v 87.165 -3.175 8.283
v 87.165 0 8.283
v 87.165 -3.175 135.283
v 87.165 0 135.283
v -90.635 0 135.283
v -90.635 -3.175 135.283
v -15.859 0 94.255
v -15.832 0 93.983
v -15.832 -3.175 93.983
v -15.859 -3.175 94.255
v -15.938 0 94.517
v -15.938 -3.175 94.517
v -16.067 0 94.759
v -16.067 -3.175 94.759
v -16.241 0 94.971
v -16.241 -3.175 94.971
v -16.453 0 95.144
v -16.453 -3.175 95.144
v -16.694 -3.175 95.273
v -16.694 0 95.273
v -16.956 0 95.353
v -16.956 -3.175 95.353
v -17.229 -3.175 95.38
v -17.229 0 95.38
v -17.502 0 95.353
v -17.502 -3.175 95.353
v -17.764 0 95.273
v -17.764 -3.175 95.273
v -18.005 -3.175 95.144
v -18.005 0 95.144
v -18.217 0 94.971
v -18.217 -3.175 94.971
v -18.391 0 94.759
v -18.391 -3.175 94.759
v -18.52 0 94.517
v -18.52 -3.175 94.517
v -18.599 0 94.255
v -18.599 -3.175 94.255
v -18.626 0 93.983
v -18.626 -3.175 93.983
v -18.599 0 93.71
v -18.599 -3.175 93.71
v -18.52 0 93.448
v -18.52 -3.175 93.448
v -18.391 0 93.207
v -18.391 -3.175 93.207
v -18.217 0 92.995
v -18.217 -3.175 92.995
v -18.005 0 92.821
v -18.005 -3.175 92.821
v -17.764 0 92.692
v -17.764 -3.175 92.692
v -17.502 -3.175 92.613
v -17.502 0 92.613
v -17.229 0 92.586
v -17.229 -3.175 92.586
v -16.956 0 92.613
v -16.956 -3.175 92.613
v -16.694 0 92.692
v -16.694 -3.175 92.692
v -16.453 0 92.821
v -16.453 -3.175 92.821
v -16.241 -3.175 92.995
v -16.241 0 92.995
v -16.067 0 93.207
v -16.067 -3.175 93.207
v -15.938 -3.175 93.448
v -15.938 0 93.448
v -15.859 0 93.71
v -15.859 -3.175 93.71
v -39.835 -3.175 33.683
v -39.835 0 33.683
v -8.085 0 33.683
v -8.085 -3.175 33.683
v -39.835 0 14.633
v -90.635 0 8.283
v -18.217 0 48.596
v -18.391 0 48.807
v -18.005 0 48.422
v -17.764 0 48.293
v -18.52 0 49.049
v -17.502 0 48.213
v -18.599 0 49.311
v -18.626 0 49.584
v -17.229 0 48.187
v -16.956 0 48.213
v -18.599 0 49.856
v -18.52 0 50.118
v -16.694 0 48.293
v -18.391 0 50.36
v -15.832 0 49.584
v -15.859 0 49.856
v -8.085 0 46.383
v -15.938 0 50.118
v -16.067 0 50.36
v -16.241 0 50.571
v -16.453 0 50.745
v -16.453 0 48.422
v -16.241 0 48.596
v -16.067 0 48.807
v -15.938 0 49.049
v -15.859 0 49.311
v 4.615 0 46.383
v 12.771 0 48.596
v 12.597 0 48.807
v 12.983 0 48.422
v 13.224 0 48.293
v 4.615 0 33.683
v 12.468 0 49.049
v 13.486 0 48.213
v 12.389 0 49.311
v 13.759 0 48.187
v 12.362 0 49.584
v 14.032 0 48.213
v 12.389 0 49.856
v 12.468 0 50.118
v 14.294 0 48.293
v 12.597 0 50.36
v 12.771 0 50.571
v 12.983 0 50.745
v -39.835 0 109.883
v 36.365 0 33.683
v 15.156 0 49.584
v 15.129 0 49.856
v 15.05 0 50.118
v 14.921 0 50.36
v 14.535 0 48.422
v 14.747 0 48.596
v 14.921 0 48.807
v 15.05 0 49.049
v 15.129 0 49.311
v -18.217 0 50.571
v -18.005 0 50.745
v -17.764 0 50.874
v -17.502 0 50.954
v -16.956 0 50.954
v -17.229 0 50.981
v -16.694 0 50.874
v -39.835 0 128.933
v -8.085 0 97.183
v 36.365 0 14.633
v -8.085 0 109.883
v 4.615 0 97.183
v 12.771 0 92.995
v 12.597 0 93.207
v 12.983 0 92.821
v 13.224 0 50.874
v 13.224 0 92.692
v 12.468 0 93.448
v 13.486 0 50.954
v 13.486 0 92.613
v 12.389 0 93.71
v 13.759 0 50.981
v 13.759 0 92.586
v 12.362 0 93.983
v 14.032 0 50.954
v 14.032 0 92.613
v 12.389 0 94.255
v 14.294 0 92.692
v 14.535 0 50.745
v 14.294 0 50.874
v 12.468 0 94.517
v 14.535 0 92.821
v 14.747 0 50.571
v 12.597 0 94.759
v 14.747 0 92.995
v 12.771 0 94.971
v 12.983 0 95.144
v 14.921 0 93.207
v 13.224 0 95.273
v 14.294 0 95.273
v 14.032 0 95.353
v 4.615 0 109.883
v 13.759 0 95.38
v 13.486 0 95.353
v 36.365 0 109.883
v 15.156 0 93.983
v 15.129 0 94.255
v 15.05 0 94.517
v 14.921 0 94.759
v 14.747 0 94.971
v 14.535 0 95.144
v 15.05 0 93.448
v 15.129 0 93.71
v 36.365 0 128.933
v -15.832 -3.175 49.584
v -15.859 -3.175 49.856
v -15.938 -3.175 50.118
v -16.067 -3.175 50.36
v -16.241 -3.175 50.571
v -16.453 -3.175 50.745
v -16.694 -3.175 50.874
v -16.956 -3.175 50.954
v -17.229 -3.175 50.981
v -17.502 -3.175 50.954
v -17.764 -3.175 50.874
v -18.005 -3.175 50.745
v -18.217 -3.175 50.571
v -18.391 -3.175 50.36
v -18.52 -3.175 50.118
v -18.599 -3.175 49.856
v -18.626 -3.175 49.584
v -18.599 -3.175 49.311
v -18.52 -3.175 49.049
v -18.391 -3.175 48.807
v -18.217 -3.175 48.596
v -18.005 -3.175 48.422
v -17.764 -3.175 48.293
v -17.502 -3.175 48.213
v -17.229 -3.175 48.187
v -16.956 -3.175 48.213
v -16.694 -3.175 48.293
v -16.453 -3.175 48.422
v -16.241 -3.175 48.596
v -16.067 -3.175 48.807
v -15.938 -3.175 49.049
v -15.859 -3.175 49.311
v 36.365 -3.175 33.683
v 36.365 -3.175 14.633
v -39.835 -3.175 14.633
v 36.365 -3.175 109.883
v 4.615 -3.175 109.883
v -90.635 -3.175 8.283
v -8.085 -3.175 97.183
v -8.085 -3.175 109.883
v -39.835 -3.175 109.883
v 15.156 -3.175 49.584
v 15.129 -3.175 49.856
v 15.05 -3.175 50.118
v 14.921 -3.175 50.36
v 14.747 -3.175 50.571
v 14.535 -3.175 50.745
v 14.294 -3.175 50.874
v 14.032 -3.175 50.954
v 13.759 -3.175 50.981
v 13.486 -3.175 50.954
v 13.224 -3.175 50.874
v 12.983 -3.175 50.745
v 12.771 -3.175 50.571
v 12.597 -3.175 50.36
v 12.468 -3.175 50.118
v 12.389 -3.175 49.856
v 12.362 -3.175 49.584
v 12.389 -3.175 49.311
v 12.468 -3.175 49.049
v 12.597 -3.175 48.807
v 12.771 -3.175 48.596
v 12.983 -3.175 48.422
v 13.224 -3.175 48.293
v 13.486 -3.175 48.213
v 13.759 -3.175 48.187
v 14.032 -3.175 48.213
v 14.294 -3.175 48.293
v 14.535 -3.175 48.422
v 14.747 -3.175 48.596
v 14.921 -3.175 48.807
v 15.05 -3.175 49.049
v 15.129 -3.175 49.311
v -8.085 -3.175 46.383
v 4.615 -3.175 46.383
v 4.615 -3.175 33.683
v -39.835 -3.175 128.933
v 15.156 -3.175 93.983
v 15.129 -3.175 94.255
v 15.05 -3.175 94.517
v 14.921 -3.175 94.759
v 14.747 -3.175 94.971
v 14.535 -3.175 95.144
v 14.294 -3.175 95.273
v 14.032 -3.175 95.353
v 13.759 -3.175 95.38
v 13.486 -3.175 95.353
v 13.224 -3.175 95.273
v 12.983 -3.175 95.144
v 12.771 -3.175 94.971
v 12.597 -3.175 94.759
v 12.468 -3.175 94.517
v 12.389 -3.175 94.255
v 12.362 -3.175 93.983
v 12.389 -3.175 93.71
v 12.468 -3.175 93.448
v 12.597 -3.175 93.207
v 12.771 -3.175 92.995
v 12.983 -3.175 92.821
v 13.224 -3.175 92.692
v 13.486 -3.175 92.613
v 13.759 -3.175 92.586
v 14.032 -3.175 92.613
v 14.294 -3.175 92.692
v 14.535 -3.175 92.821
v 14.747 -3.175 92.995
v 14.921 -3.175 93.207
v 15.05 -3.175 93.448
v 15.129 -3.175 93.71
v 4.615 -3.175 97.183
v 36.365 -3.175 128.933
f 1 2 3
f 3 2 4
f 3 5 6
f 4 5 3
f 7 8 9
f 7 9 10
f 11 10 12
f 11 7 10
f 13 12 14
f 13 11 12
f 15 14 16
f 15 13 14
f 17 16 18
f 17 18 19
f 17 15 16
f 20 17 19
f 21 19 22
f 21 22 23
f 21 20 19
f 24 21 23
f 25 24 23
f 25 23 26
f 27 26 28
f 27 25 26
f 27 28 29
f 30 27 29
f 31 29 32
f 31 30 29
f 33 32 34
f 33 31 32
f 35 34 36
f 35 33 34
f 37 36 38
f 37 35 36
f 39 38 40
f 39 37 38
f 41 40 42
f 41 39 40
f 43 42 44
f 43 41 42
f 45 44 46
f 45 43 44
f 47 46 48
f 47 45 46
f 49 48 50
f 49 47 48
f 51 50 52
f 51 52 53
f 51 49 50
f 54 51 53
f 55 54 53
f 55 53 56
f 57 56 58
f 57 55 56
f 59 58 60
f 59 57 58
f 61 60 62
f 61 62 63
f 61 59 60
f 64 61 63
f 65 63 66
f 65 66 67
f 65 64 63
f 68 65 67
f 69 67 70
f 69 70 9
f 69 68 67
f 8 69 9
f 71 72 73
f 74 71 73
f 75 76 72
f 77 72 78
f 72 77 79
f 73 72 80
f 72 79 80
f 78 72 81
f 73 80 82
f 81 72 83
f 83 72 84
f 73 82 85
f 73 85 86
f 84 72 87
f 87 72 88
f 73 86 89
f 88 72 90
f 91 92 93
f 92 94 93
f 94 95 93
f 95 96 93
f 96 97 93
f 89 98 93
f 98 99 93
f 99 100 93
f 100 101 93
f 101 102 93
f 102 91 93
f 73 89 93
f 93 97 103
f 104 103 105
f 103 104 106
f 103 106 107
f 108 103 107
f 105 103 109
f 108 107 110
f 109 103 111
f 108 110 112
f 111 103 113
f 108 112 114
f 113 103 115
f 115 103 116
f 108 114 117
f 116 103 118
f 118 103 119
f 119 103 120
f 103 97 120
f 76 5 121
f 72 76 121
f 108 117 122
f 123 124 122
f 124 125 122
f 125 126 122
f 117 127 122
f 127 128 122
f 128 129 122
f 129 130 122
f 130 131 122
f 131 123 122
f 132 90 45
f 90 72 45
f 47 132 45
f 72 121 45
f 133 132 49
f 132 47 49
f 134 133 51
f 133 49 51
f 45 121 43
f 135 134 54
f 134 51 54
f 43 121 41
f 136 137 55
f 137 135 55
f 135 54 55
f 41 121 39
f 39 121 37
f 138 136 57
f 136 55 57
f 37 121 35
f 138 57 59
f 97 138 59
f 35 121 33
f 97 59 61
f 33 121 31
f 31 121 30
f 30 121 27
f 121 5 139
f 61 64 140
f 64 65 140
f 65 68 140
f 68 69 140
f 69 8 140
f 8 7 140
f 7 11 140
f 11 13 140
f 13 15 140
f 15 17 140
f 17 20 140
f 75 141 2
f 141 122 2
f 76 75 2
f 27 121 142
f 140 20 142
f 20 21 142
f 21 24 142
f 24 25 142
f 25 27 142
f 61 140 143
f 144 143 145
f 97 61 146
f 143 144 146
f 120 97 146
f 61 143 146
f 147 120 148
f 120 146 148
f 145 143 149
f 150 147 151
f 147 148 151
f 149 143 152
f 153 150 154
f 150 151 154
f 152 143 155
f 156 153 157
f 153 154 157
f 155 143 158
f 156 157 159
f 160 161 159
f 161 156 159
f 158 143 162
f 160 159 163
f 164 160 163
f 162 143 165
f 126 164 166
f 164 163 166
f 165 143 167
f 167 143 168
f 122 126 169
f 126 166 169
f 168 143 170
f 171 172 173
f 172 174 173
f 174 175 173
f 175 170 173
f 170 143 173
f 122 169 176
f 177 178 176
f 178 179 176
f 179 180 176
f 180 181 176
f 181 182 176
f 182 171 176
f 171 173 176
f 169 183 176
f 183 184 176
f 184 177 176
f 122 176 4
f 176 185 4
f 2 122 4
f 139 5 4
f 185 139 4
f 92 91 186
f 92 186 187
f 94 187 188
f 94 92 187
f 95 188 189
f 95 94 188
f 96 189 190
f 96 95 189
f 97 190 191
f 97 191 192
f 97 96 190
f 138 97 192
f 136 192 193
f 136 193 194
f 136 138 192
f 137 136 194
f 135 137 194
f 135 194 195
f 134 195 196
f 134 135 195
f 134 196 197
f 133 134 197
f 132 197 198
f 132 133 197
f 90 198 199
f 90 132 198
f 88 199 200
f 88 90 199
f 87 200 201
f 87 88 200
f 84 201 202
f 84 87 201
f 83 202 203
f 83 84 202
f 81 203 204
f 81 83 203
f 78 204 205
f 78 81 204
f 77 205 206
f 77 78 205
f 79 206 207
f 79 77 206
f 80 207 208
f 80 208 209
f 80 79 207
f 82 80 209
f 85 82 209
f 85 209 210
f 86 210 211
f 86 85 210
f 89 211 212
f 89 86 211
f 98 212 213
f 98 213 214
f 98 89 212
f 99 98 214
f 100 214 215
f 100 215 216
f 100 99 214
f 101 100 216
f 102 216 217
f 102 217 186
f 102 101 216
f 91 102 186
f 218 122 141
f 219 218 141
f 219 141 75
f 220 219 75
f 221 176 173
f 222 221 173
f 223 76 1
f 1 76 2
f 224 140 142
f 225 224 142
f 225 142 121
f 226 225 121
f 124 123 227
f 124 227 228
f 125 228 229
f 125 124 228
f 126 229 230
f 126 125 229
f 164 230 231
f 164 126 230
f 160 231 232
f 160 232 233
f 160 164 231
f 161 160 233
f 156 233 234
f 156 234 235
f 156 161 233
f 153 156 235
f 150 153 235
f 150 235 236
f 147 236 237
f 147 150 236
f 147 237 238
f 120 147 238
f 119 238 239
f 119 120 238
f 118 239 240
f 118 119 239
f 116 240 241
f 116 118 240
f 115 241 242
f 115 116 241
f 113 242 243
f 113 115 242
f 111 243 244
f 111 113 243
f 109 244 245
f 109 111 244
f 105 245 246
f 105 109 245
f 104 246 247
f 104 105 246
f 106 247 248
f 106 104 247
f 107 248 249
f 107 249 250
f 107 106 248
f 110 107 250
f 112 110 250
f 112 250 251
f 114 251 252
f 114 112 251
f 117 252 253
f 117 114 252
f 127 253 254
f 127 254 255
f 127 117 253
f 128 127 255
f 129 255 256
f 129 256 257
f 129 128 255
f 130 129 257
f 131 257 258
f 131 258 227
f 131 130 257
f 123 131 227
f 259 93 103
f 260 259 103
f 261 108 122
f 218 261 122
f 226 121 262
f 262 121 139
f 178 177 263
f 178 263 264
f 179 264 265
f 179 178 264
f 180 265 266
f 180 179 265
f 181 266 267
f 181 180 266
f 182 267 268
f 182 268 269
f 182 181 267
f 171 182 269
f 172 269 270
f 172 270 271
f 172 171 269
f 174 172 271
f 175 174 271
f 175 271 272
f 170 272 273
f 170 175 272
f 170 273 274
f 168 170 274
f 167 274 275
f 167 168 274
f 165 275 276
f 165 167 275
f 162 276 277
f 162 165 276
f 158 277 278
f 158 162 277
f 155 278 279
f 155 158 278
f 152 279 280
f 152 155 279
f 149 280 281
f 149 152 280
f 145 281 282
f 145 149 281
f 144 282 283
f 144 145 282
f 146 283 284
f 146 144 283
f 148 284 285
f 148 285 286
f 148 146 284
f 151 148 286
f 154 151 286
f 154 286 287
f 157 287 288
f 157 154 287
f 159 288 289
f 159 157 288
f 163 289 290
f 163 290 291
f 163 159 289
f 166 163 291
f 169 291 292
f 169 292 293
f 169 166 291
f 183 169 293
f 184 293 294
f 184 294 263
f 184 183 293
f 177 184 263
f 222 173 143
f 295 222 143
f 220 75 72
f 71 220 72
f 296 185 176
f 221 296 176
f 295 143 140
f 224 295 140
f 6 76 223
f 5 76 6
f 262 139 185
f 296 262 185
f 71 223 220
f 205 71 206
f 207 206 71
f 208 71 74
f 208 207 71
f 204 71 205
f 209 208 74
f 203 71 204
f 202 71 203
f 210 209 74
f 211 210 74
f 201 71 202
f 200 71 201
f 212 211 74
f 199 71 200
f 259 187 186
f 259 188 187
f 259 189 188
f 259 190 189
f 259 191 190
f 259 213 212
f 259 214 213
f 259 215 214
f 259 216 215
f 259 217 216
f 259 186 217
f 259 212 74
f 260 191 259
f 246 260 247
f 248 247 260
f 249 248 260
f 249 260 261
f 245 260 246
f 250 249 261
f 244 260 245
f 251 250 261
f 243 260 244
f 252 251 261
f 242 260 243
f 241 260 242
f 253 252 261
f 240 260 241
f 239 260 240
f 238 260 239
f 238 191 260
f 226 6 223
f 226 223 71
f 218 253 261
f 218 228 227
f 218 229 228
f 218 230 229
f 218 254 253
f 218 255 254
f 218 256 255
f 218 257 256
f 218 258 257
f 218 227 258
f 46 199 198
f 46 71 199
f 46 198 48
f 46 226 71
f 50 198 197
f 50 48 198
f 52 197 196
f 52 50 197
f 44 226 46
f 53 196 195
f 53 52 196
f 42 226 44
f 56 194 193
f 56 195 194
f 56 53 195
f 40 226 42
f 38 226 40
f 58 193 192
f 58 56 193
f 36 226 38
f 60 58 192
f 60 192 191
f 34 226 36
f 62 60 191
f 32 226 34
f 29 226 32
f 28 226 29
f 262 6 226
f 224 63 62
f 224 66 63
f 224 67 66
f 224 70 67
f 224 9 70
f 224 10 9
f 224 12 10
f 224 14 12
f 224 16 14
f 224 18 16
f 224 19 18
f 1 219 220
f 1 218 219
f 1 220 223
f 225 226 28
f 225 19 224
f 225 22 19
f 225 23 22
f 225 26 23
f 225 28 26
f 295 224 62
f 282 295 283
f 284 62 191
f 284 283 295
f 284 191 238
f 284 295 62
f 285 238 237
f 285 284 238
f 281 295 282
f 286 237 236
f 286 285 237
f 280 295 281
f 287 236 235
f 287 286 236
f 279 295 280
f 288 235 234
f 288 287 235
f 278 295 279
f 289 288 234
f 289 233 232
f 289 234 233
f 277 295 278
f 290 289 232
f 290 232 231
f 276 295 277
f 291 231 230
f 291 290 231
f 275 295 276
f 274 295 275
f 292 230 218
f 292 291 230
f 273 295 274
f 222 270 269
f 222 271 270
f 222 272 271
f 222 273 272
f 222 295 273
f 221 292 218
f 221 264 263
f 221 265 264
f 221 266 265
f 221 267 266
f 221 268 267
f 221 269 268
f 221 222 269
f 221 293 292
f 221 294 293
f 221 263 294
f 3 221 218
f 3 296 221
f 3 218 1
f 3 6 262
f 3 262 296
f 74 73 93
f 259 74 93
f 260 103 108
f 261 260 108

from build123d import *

# Parameters (mm, degrees)
F0_W     = 177.8
F0_H     = 127
F0_R     = 1.397
F1_DEPTH = 3.175


# Not quite as in the source:
# - a feature names something its author has since deleted; it is built from what else it names


with BuildPart() as f1:
    # F0 (on Front) → F1 (new body)
    with BuildSketch(Plane.XZ):
        with Locations((-1.7349944949, 71.7831266678)):
            Rectangle(F0_W, F0_H)
        with Locations((-17.2289944949, 49.5835266678)):
            Circle(F0_R, mode=Mode.SUBTRACT)
        Polygon((-39.8349944949, 14.6331266678), (-39.8349944949, 33.6831266678), (-8.0849944949, 33.6831266678), (-8.0849944949, 46.3831266678), (4.6150055051, 46.3831266678), (4.6150055051, 33.6831266678), (36.3650055051, 33.6831266678), (36.3650055051, 14.6331266678), align=None, mode=Mode.SUBTRACT)
        with Locations((13.7590055051, 49.5835266678)):
            Circle(F0_R, mode=Mode.SUBTRACT)
        with Locations((-17.2289944949, 93.9827266678)):
            Circle(F0_R, mode=Mode.SUBTRACT)
        Polygon((-39.8349944949, 109.8831266678), (-39.8349944949, 128.9331266678), (36.3650055051, 128.9331266678), (36.3650055051, 109.8831266678), (4.6150055051, 109.8831266678), (4.6150055051, 97.1831266678), (-8.0849944949, 97.1831266678), (-8.0849944949, 109.8831266678), align=None, mode=Mode.SUBTRACT)
        with Locations((13.7590055051, 93.9827266678)):
            Circle(F0_R, mode=Mode.SUBTRACT)
    extrude(amount=F1_DEPTH)


solid = f1.part
